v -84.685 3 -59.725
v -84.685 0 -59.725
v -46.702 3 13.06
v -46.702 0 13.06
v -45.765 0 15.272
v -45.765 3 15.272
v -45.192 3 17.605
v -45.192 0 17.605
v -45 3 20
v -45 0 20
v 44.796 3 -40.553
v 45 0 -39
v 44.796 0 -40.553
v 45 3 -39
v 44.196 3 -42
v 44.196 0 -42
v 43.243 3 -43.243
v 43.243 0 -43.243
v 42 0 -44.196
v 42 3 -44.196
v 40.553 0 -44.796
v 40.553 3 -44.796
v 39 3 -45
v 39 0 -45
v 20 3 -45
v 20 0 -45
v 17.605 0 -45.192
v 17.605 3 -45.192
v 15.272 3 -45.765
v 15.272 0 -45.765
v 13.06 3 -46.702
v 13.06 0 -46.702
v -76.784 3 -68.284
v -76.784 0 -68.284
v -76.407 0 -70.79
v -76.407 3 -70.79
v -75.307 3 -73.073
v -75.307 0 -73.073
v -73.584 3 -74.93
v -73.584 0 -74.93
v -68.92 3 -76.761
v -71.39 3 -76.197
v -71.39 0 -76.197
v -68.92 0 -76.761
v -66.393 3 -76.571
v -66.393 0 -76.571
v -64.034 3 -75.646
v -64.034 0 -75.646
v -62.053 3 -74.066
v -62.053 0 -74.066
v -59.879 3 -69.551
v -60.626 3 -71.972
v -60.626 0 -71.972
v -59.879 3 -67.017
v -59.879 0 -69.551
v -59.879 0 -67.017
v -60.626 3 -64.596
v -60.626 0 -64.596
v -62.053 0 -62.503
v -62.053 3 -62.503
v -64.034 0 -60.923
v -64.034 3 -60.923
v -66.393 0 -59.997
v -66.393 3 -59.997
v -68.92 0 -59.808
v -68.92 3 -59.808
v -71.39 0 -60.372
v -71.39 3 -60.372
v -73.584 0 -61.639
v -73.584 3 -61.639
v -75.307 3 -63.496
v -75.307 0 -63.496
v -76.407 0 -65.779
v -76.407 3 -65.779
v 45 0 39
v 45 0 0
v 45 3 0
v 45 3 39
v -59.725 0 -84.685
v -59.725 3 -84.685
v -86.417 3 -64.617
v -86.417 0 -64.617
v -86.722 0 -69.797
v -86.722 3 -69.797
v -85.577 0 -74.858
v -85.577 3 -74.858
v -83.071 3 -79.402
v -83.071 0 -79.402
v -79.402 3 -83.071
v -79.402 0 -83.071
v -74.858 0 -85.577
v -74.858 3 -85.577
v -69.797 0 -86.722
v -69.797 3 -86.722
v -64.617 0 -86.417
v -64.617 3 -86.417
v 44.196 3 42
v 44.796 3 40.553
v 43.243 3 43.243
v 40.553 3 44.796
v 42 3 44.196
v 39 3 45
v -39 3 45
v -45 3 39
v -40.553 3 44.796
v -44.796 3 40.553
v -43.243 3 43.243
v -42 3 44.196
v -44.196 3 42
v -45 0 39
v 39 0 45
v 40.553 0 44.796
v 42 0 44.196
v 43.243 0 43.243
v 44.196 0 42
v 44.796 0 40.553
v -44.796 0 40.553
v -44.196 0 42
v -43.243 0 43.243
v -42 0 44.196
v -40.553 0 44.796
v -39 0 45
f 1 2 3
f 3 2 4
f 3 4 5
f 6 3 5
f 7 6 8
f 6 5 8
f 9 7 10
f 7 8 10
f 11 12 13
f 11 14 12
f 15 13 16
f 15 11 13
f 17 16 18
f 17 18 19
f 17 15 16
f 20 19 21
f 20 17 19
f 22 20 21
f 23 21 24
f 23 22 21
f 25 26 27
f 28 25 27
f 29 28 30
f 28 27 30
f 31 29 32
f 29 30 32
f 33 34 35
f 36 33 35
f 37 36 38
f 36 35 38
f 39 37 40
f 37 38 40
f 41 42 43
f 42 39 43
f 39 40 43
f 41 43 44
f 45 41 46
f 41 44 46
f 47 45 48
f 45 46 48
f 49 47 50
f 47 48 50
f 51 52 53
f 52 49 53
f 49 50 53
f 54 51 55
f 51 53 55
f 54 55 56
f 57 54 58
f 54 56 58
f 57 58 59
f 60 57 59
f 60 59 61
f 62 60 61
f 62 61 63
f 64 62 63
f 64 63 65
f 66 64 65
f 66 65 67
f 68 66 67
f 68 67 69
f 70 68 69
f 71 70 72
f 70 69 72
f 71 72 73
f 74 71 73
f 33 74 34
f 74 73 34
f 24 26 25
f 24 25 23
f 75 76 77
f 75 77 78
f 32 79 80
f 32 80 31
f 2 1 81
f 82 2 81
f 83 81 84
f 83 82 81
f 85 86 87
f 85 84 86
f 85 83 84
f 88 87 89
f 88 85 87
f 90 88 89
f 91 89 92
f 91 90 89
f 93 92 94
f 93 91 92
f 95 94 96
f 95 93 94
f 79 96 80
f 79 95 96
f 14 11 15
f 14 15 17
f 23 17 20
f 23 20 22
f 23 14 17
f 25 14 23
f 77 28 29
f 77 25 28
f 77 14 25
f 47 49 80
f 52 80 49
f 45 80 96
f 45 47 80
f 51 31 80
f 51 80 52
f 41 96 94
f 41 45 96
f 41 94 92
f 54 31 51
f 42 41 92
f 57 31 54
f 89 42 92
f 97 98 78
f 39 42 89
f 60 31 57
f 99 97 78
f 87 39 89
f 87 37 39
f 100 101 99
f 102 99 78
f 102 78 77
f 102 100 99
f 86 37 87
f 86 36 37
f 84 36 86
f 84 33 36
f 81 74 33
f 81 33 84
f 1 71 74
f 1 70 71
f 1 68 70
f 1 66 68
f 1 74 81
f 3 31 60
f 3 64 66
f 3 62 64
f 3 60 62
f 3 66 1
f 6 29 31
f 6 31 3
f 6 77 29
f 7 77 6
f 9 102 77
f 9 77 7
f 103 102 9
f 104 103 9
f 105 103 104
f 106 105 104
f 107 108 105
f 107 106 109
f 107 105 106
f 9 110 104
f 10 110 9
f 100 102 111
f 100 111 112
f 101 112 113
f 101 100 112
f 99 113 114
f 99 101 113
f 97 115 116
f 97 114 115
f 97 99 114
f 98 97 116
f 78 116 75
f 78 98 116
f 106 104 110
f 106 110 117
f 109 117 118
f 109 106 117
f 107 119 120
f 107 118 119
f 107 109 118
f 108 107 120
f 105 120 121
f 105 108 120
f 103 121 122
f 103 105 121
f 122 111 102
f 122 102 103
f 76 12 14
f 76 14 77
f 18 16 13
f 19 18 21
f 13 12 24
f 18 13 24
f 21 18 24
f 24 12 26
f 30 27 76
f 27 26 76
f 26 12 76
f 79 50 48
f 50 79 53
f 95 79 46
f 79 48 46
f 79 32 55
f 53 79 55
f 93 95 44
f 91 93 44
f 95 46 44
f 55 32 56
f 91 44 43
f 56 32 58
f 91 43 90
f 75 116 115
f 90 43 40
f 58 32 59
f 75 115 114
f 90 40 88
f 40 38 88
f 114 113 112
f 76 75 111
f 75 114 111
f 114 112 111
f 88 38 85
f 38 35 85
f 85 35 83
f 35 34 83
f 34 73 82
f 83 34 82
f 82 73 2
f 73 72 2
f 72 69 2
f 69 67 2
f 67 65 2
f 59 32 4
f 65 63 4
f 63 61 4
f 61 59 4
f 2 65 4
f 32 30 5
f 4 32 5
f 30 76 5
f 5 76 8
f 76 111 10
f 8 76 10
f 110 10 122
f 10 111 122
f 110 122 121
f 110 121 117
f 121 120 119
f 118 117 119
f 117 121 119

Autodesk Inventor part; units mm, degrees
ref_plane "YZ Plane" through (0, 0, 0) normal (1, 0, 0) x (0, 1, 0)
ref_plane "XZ Plane" through (0, 0, 0) normal (0, 1, 0) x (-1, 0, 0)
ref_plane "XY Plane" through (0, 0, 0) normal (0, 0, 1) x (1, 0, 0)
sketch "Sketch1" plane through (0, 0, 0) normal (0, 1, 0) x (-1, 0, 0)
  line L0 (40, 40) -> (-40, 40) construction
  line L1 (-40, 40) -> (-40, -40) construction
  line L2 (-40, -40) -> (40, -40) construction
  line L3 (40, -40) -> (40, 40) construction
  line L4 (-40, 40) -> (40, -40) construction
  line L5 (0, 40) -> (0, -40) construction
  line L6 (-45, -45) -> (-45, 0)
  line L7 (-20, -45) -> (-45, -45)
  arc A0 (59.7253, -84.6853) -> (84.6853, -59.7253) centre (68.2843, -68.2843) ccw
  circle A1 centre (68.2843, -68.2843) radius 8.5
  line L8 (59.7253, -84.6853) -> (-13.0603, -46.7019)
  arc A2 (-13.0603, -46.7019) -> (-20, -45) centre (-20, -60) ccw
  arc A3 (84.6853, -59.7253) -> (59.7253, -84.6853) centre (68.2843, -68.2843) ccw construction
  line L9 (84.6853, -59.7253) -> (46.7019, 13.0603)
  line L10 (-45, 0) -> (-45, 45)
  line L11 (-45, 45) -> (45, 45)
  line L12 (45, 45) -> (45, 20)
  arc A4 (45, 20) -> (46.7019, 13.0603) centre (60, 20) ccw
  line L13 (40, 0) -> (45, 0) construction
  line L14 (0, 40) -> (0, 45) construction
  line L15 (-40, 0) -> (-45, 0) construction
  point P0 (0, 0)
  point P1 (0, 0)
  point P2 (0, 0)
  dimension "d2" = 80
  dimension "d3" = 80
  dimension "d29" = 5
  dimension "d30" = 17
  dimension "d31" = 10
  dimension "d32" = 40
  dimension "d34" = 5
  dimension "d35" = 15
  dimension "d36" = 25
extrude "Plate1" add sketch "Sketch1" along normal blind 3
fillet "Corner Round3" radius 6 3 edges at (-45, 1.5, 45) (45, 1.5, 45) (45, 1.5, -45)
equation "\"d34\" = d29"
equation "\"d6\" = Thickness"
equation "\"Thickness\" = 3"
properties part number "MSC 901 BASE PLATE" material "Stainless Steel"
